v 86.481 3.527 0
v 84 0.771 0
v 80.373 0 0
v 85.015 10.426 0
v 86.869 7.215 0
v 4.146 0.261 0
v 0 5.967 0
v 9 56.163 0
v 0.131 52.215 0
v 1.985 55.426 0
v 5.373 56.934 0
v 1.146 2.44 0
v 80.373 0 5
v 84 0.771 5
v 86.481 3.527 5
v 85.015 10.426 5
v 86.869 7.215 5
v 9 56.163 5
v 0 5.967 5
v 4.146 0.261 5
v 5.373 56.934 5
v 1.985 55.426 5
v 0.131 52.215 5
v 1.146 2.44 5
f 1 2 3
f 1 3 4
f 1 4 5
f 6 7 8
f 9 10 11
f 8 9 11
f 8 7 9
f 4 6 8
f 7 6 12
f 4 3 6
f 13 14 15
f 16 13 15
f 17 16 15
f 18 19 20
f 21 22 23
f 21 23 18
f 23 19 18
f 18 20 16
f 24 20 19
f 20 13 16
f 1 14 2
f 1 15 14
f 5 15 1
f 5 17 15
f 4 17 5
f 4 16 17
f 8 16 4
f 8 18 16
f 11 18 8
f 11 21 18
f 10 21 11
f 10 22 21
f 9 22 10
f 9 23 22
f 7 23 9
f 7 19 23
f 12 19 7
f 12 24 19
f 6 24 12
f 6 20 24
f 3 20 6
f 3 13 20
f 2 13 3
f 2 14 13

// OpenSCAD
$fn = 32;

// ----------------------------------------------------------------------
// Lever arm: two bosses 12 and 12 mm, 75 mm between centres
// ----------------------------------------------------------------------

// --- parameters (mm) ---
profile_height = 5;       // extrusion height
profile_points = 12;      // points of the closed outline

profile = [[0, 5.967], [1.146, 2.44], [4.146, 0.261], [80.373, 0], [84, 0.771], [86.481, 3.527], [86.869, 7.215], [85.015, 10.426], [9, 56.163], [5.373, 56.934], [1.985, 55.426], [0.131, 52.215]];  // single closed polygon, 12 points, counter clockwise

// --- the one profile operation ---
linear_extrude(height = profile_height) polygon(points = profile);
